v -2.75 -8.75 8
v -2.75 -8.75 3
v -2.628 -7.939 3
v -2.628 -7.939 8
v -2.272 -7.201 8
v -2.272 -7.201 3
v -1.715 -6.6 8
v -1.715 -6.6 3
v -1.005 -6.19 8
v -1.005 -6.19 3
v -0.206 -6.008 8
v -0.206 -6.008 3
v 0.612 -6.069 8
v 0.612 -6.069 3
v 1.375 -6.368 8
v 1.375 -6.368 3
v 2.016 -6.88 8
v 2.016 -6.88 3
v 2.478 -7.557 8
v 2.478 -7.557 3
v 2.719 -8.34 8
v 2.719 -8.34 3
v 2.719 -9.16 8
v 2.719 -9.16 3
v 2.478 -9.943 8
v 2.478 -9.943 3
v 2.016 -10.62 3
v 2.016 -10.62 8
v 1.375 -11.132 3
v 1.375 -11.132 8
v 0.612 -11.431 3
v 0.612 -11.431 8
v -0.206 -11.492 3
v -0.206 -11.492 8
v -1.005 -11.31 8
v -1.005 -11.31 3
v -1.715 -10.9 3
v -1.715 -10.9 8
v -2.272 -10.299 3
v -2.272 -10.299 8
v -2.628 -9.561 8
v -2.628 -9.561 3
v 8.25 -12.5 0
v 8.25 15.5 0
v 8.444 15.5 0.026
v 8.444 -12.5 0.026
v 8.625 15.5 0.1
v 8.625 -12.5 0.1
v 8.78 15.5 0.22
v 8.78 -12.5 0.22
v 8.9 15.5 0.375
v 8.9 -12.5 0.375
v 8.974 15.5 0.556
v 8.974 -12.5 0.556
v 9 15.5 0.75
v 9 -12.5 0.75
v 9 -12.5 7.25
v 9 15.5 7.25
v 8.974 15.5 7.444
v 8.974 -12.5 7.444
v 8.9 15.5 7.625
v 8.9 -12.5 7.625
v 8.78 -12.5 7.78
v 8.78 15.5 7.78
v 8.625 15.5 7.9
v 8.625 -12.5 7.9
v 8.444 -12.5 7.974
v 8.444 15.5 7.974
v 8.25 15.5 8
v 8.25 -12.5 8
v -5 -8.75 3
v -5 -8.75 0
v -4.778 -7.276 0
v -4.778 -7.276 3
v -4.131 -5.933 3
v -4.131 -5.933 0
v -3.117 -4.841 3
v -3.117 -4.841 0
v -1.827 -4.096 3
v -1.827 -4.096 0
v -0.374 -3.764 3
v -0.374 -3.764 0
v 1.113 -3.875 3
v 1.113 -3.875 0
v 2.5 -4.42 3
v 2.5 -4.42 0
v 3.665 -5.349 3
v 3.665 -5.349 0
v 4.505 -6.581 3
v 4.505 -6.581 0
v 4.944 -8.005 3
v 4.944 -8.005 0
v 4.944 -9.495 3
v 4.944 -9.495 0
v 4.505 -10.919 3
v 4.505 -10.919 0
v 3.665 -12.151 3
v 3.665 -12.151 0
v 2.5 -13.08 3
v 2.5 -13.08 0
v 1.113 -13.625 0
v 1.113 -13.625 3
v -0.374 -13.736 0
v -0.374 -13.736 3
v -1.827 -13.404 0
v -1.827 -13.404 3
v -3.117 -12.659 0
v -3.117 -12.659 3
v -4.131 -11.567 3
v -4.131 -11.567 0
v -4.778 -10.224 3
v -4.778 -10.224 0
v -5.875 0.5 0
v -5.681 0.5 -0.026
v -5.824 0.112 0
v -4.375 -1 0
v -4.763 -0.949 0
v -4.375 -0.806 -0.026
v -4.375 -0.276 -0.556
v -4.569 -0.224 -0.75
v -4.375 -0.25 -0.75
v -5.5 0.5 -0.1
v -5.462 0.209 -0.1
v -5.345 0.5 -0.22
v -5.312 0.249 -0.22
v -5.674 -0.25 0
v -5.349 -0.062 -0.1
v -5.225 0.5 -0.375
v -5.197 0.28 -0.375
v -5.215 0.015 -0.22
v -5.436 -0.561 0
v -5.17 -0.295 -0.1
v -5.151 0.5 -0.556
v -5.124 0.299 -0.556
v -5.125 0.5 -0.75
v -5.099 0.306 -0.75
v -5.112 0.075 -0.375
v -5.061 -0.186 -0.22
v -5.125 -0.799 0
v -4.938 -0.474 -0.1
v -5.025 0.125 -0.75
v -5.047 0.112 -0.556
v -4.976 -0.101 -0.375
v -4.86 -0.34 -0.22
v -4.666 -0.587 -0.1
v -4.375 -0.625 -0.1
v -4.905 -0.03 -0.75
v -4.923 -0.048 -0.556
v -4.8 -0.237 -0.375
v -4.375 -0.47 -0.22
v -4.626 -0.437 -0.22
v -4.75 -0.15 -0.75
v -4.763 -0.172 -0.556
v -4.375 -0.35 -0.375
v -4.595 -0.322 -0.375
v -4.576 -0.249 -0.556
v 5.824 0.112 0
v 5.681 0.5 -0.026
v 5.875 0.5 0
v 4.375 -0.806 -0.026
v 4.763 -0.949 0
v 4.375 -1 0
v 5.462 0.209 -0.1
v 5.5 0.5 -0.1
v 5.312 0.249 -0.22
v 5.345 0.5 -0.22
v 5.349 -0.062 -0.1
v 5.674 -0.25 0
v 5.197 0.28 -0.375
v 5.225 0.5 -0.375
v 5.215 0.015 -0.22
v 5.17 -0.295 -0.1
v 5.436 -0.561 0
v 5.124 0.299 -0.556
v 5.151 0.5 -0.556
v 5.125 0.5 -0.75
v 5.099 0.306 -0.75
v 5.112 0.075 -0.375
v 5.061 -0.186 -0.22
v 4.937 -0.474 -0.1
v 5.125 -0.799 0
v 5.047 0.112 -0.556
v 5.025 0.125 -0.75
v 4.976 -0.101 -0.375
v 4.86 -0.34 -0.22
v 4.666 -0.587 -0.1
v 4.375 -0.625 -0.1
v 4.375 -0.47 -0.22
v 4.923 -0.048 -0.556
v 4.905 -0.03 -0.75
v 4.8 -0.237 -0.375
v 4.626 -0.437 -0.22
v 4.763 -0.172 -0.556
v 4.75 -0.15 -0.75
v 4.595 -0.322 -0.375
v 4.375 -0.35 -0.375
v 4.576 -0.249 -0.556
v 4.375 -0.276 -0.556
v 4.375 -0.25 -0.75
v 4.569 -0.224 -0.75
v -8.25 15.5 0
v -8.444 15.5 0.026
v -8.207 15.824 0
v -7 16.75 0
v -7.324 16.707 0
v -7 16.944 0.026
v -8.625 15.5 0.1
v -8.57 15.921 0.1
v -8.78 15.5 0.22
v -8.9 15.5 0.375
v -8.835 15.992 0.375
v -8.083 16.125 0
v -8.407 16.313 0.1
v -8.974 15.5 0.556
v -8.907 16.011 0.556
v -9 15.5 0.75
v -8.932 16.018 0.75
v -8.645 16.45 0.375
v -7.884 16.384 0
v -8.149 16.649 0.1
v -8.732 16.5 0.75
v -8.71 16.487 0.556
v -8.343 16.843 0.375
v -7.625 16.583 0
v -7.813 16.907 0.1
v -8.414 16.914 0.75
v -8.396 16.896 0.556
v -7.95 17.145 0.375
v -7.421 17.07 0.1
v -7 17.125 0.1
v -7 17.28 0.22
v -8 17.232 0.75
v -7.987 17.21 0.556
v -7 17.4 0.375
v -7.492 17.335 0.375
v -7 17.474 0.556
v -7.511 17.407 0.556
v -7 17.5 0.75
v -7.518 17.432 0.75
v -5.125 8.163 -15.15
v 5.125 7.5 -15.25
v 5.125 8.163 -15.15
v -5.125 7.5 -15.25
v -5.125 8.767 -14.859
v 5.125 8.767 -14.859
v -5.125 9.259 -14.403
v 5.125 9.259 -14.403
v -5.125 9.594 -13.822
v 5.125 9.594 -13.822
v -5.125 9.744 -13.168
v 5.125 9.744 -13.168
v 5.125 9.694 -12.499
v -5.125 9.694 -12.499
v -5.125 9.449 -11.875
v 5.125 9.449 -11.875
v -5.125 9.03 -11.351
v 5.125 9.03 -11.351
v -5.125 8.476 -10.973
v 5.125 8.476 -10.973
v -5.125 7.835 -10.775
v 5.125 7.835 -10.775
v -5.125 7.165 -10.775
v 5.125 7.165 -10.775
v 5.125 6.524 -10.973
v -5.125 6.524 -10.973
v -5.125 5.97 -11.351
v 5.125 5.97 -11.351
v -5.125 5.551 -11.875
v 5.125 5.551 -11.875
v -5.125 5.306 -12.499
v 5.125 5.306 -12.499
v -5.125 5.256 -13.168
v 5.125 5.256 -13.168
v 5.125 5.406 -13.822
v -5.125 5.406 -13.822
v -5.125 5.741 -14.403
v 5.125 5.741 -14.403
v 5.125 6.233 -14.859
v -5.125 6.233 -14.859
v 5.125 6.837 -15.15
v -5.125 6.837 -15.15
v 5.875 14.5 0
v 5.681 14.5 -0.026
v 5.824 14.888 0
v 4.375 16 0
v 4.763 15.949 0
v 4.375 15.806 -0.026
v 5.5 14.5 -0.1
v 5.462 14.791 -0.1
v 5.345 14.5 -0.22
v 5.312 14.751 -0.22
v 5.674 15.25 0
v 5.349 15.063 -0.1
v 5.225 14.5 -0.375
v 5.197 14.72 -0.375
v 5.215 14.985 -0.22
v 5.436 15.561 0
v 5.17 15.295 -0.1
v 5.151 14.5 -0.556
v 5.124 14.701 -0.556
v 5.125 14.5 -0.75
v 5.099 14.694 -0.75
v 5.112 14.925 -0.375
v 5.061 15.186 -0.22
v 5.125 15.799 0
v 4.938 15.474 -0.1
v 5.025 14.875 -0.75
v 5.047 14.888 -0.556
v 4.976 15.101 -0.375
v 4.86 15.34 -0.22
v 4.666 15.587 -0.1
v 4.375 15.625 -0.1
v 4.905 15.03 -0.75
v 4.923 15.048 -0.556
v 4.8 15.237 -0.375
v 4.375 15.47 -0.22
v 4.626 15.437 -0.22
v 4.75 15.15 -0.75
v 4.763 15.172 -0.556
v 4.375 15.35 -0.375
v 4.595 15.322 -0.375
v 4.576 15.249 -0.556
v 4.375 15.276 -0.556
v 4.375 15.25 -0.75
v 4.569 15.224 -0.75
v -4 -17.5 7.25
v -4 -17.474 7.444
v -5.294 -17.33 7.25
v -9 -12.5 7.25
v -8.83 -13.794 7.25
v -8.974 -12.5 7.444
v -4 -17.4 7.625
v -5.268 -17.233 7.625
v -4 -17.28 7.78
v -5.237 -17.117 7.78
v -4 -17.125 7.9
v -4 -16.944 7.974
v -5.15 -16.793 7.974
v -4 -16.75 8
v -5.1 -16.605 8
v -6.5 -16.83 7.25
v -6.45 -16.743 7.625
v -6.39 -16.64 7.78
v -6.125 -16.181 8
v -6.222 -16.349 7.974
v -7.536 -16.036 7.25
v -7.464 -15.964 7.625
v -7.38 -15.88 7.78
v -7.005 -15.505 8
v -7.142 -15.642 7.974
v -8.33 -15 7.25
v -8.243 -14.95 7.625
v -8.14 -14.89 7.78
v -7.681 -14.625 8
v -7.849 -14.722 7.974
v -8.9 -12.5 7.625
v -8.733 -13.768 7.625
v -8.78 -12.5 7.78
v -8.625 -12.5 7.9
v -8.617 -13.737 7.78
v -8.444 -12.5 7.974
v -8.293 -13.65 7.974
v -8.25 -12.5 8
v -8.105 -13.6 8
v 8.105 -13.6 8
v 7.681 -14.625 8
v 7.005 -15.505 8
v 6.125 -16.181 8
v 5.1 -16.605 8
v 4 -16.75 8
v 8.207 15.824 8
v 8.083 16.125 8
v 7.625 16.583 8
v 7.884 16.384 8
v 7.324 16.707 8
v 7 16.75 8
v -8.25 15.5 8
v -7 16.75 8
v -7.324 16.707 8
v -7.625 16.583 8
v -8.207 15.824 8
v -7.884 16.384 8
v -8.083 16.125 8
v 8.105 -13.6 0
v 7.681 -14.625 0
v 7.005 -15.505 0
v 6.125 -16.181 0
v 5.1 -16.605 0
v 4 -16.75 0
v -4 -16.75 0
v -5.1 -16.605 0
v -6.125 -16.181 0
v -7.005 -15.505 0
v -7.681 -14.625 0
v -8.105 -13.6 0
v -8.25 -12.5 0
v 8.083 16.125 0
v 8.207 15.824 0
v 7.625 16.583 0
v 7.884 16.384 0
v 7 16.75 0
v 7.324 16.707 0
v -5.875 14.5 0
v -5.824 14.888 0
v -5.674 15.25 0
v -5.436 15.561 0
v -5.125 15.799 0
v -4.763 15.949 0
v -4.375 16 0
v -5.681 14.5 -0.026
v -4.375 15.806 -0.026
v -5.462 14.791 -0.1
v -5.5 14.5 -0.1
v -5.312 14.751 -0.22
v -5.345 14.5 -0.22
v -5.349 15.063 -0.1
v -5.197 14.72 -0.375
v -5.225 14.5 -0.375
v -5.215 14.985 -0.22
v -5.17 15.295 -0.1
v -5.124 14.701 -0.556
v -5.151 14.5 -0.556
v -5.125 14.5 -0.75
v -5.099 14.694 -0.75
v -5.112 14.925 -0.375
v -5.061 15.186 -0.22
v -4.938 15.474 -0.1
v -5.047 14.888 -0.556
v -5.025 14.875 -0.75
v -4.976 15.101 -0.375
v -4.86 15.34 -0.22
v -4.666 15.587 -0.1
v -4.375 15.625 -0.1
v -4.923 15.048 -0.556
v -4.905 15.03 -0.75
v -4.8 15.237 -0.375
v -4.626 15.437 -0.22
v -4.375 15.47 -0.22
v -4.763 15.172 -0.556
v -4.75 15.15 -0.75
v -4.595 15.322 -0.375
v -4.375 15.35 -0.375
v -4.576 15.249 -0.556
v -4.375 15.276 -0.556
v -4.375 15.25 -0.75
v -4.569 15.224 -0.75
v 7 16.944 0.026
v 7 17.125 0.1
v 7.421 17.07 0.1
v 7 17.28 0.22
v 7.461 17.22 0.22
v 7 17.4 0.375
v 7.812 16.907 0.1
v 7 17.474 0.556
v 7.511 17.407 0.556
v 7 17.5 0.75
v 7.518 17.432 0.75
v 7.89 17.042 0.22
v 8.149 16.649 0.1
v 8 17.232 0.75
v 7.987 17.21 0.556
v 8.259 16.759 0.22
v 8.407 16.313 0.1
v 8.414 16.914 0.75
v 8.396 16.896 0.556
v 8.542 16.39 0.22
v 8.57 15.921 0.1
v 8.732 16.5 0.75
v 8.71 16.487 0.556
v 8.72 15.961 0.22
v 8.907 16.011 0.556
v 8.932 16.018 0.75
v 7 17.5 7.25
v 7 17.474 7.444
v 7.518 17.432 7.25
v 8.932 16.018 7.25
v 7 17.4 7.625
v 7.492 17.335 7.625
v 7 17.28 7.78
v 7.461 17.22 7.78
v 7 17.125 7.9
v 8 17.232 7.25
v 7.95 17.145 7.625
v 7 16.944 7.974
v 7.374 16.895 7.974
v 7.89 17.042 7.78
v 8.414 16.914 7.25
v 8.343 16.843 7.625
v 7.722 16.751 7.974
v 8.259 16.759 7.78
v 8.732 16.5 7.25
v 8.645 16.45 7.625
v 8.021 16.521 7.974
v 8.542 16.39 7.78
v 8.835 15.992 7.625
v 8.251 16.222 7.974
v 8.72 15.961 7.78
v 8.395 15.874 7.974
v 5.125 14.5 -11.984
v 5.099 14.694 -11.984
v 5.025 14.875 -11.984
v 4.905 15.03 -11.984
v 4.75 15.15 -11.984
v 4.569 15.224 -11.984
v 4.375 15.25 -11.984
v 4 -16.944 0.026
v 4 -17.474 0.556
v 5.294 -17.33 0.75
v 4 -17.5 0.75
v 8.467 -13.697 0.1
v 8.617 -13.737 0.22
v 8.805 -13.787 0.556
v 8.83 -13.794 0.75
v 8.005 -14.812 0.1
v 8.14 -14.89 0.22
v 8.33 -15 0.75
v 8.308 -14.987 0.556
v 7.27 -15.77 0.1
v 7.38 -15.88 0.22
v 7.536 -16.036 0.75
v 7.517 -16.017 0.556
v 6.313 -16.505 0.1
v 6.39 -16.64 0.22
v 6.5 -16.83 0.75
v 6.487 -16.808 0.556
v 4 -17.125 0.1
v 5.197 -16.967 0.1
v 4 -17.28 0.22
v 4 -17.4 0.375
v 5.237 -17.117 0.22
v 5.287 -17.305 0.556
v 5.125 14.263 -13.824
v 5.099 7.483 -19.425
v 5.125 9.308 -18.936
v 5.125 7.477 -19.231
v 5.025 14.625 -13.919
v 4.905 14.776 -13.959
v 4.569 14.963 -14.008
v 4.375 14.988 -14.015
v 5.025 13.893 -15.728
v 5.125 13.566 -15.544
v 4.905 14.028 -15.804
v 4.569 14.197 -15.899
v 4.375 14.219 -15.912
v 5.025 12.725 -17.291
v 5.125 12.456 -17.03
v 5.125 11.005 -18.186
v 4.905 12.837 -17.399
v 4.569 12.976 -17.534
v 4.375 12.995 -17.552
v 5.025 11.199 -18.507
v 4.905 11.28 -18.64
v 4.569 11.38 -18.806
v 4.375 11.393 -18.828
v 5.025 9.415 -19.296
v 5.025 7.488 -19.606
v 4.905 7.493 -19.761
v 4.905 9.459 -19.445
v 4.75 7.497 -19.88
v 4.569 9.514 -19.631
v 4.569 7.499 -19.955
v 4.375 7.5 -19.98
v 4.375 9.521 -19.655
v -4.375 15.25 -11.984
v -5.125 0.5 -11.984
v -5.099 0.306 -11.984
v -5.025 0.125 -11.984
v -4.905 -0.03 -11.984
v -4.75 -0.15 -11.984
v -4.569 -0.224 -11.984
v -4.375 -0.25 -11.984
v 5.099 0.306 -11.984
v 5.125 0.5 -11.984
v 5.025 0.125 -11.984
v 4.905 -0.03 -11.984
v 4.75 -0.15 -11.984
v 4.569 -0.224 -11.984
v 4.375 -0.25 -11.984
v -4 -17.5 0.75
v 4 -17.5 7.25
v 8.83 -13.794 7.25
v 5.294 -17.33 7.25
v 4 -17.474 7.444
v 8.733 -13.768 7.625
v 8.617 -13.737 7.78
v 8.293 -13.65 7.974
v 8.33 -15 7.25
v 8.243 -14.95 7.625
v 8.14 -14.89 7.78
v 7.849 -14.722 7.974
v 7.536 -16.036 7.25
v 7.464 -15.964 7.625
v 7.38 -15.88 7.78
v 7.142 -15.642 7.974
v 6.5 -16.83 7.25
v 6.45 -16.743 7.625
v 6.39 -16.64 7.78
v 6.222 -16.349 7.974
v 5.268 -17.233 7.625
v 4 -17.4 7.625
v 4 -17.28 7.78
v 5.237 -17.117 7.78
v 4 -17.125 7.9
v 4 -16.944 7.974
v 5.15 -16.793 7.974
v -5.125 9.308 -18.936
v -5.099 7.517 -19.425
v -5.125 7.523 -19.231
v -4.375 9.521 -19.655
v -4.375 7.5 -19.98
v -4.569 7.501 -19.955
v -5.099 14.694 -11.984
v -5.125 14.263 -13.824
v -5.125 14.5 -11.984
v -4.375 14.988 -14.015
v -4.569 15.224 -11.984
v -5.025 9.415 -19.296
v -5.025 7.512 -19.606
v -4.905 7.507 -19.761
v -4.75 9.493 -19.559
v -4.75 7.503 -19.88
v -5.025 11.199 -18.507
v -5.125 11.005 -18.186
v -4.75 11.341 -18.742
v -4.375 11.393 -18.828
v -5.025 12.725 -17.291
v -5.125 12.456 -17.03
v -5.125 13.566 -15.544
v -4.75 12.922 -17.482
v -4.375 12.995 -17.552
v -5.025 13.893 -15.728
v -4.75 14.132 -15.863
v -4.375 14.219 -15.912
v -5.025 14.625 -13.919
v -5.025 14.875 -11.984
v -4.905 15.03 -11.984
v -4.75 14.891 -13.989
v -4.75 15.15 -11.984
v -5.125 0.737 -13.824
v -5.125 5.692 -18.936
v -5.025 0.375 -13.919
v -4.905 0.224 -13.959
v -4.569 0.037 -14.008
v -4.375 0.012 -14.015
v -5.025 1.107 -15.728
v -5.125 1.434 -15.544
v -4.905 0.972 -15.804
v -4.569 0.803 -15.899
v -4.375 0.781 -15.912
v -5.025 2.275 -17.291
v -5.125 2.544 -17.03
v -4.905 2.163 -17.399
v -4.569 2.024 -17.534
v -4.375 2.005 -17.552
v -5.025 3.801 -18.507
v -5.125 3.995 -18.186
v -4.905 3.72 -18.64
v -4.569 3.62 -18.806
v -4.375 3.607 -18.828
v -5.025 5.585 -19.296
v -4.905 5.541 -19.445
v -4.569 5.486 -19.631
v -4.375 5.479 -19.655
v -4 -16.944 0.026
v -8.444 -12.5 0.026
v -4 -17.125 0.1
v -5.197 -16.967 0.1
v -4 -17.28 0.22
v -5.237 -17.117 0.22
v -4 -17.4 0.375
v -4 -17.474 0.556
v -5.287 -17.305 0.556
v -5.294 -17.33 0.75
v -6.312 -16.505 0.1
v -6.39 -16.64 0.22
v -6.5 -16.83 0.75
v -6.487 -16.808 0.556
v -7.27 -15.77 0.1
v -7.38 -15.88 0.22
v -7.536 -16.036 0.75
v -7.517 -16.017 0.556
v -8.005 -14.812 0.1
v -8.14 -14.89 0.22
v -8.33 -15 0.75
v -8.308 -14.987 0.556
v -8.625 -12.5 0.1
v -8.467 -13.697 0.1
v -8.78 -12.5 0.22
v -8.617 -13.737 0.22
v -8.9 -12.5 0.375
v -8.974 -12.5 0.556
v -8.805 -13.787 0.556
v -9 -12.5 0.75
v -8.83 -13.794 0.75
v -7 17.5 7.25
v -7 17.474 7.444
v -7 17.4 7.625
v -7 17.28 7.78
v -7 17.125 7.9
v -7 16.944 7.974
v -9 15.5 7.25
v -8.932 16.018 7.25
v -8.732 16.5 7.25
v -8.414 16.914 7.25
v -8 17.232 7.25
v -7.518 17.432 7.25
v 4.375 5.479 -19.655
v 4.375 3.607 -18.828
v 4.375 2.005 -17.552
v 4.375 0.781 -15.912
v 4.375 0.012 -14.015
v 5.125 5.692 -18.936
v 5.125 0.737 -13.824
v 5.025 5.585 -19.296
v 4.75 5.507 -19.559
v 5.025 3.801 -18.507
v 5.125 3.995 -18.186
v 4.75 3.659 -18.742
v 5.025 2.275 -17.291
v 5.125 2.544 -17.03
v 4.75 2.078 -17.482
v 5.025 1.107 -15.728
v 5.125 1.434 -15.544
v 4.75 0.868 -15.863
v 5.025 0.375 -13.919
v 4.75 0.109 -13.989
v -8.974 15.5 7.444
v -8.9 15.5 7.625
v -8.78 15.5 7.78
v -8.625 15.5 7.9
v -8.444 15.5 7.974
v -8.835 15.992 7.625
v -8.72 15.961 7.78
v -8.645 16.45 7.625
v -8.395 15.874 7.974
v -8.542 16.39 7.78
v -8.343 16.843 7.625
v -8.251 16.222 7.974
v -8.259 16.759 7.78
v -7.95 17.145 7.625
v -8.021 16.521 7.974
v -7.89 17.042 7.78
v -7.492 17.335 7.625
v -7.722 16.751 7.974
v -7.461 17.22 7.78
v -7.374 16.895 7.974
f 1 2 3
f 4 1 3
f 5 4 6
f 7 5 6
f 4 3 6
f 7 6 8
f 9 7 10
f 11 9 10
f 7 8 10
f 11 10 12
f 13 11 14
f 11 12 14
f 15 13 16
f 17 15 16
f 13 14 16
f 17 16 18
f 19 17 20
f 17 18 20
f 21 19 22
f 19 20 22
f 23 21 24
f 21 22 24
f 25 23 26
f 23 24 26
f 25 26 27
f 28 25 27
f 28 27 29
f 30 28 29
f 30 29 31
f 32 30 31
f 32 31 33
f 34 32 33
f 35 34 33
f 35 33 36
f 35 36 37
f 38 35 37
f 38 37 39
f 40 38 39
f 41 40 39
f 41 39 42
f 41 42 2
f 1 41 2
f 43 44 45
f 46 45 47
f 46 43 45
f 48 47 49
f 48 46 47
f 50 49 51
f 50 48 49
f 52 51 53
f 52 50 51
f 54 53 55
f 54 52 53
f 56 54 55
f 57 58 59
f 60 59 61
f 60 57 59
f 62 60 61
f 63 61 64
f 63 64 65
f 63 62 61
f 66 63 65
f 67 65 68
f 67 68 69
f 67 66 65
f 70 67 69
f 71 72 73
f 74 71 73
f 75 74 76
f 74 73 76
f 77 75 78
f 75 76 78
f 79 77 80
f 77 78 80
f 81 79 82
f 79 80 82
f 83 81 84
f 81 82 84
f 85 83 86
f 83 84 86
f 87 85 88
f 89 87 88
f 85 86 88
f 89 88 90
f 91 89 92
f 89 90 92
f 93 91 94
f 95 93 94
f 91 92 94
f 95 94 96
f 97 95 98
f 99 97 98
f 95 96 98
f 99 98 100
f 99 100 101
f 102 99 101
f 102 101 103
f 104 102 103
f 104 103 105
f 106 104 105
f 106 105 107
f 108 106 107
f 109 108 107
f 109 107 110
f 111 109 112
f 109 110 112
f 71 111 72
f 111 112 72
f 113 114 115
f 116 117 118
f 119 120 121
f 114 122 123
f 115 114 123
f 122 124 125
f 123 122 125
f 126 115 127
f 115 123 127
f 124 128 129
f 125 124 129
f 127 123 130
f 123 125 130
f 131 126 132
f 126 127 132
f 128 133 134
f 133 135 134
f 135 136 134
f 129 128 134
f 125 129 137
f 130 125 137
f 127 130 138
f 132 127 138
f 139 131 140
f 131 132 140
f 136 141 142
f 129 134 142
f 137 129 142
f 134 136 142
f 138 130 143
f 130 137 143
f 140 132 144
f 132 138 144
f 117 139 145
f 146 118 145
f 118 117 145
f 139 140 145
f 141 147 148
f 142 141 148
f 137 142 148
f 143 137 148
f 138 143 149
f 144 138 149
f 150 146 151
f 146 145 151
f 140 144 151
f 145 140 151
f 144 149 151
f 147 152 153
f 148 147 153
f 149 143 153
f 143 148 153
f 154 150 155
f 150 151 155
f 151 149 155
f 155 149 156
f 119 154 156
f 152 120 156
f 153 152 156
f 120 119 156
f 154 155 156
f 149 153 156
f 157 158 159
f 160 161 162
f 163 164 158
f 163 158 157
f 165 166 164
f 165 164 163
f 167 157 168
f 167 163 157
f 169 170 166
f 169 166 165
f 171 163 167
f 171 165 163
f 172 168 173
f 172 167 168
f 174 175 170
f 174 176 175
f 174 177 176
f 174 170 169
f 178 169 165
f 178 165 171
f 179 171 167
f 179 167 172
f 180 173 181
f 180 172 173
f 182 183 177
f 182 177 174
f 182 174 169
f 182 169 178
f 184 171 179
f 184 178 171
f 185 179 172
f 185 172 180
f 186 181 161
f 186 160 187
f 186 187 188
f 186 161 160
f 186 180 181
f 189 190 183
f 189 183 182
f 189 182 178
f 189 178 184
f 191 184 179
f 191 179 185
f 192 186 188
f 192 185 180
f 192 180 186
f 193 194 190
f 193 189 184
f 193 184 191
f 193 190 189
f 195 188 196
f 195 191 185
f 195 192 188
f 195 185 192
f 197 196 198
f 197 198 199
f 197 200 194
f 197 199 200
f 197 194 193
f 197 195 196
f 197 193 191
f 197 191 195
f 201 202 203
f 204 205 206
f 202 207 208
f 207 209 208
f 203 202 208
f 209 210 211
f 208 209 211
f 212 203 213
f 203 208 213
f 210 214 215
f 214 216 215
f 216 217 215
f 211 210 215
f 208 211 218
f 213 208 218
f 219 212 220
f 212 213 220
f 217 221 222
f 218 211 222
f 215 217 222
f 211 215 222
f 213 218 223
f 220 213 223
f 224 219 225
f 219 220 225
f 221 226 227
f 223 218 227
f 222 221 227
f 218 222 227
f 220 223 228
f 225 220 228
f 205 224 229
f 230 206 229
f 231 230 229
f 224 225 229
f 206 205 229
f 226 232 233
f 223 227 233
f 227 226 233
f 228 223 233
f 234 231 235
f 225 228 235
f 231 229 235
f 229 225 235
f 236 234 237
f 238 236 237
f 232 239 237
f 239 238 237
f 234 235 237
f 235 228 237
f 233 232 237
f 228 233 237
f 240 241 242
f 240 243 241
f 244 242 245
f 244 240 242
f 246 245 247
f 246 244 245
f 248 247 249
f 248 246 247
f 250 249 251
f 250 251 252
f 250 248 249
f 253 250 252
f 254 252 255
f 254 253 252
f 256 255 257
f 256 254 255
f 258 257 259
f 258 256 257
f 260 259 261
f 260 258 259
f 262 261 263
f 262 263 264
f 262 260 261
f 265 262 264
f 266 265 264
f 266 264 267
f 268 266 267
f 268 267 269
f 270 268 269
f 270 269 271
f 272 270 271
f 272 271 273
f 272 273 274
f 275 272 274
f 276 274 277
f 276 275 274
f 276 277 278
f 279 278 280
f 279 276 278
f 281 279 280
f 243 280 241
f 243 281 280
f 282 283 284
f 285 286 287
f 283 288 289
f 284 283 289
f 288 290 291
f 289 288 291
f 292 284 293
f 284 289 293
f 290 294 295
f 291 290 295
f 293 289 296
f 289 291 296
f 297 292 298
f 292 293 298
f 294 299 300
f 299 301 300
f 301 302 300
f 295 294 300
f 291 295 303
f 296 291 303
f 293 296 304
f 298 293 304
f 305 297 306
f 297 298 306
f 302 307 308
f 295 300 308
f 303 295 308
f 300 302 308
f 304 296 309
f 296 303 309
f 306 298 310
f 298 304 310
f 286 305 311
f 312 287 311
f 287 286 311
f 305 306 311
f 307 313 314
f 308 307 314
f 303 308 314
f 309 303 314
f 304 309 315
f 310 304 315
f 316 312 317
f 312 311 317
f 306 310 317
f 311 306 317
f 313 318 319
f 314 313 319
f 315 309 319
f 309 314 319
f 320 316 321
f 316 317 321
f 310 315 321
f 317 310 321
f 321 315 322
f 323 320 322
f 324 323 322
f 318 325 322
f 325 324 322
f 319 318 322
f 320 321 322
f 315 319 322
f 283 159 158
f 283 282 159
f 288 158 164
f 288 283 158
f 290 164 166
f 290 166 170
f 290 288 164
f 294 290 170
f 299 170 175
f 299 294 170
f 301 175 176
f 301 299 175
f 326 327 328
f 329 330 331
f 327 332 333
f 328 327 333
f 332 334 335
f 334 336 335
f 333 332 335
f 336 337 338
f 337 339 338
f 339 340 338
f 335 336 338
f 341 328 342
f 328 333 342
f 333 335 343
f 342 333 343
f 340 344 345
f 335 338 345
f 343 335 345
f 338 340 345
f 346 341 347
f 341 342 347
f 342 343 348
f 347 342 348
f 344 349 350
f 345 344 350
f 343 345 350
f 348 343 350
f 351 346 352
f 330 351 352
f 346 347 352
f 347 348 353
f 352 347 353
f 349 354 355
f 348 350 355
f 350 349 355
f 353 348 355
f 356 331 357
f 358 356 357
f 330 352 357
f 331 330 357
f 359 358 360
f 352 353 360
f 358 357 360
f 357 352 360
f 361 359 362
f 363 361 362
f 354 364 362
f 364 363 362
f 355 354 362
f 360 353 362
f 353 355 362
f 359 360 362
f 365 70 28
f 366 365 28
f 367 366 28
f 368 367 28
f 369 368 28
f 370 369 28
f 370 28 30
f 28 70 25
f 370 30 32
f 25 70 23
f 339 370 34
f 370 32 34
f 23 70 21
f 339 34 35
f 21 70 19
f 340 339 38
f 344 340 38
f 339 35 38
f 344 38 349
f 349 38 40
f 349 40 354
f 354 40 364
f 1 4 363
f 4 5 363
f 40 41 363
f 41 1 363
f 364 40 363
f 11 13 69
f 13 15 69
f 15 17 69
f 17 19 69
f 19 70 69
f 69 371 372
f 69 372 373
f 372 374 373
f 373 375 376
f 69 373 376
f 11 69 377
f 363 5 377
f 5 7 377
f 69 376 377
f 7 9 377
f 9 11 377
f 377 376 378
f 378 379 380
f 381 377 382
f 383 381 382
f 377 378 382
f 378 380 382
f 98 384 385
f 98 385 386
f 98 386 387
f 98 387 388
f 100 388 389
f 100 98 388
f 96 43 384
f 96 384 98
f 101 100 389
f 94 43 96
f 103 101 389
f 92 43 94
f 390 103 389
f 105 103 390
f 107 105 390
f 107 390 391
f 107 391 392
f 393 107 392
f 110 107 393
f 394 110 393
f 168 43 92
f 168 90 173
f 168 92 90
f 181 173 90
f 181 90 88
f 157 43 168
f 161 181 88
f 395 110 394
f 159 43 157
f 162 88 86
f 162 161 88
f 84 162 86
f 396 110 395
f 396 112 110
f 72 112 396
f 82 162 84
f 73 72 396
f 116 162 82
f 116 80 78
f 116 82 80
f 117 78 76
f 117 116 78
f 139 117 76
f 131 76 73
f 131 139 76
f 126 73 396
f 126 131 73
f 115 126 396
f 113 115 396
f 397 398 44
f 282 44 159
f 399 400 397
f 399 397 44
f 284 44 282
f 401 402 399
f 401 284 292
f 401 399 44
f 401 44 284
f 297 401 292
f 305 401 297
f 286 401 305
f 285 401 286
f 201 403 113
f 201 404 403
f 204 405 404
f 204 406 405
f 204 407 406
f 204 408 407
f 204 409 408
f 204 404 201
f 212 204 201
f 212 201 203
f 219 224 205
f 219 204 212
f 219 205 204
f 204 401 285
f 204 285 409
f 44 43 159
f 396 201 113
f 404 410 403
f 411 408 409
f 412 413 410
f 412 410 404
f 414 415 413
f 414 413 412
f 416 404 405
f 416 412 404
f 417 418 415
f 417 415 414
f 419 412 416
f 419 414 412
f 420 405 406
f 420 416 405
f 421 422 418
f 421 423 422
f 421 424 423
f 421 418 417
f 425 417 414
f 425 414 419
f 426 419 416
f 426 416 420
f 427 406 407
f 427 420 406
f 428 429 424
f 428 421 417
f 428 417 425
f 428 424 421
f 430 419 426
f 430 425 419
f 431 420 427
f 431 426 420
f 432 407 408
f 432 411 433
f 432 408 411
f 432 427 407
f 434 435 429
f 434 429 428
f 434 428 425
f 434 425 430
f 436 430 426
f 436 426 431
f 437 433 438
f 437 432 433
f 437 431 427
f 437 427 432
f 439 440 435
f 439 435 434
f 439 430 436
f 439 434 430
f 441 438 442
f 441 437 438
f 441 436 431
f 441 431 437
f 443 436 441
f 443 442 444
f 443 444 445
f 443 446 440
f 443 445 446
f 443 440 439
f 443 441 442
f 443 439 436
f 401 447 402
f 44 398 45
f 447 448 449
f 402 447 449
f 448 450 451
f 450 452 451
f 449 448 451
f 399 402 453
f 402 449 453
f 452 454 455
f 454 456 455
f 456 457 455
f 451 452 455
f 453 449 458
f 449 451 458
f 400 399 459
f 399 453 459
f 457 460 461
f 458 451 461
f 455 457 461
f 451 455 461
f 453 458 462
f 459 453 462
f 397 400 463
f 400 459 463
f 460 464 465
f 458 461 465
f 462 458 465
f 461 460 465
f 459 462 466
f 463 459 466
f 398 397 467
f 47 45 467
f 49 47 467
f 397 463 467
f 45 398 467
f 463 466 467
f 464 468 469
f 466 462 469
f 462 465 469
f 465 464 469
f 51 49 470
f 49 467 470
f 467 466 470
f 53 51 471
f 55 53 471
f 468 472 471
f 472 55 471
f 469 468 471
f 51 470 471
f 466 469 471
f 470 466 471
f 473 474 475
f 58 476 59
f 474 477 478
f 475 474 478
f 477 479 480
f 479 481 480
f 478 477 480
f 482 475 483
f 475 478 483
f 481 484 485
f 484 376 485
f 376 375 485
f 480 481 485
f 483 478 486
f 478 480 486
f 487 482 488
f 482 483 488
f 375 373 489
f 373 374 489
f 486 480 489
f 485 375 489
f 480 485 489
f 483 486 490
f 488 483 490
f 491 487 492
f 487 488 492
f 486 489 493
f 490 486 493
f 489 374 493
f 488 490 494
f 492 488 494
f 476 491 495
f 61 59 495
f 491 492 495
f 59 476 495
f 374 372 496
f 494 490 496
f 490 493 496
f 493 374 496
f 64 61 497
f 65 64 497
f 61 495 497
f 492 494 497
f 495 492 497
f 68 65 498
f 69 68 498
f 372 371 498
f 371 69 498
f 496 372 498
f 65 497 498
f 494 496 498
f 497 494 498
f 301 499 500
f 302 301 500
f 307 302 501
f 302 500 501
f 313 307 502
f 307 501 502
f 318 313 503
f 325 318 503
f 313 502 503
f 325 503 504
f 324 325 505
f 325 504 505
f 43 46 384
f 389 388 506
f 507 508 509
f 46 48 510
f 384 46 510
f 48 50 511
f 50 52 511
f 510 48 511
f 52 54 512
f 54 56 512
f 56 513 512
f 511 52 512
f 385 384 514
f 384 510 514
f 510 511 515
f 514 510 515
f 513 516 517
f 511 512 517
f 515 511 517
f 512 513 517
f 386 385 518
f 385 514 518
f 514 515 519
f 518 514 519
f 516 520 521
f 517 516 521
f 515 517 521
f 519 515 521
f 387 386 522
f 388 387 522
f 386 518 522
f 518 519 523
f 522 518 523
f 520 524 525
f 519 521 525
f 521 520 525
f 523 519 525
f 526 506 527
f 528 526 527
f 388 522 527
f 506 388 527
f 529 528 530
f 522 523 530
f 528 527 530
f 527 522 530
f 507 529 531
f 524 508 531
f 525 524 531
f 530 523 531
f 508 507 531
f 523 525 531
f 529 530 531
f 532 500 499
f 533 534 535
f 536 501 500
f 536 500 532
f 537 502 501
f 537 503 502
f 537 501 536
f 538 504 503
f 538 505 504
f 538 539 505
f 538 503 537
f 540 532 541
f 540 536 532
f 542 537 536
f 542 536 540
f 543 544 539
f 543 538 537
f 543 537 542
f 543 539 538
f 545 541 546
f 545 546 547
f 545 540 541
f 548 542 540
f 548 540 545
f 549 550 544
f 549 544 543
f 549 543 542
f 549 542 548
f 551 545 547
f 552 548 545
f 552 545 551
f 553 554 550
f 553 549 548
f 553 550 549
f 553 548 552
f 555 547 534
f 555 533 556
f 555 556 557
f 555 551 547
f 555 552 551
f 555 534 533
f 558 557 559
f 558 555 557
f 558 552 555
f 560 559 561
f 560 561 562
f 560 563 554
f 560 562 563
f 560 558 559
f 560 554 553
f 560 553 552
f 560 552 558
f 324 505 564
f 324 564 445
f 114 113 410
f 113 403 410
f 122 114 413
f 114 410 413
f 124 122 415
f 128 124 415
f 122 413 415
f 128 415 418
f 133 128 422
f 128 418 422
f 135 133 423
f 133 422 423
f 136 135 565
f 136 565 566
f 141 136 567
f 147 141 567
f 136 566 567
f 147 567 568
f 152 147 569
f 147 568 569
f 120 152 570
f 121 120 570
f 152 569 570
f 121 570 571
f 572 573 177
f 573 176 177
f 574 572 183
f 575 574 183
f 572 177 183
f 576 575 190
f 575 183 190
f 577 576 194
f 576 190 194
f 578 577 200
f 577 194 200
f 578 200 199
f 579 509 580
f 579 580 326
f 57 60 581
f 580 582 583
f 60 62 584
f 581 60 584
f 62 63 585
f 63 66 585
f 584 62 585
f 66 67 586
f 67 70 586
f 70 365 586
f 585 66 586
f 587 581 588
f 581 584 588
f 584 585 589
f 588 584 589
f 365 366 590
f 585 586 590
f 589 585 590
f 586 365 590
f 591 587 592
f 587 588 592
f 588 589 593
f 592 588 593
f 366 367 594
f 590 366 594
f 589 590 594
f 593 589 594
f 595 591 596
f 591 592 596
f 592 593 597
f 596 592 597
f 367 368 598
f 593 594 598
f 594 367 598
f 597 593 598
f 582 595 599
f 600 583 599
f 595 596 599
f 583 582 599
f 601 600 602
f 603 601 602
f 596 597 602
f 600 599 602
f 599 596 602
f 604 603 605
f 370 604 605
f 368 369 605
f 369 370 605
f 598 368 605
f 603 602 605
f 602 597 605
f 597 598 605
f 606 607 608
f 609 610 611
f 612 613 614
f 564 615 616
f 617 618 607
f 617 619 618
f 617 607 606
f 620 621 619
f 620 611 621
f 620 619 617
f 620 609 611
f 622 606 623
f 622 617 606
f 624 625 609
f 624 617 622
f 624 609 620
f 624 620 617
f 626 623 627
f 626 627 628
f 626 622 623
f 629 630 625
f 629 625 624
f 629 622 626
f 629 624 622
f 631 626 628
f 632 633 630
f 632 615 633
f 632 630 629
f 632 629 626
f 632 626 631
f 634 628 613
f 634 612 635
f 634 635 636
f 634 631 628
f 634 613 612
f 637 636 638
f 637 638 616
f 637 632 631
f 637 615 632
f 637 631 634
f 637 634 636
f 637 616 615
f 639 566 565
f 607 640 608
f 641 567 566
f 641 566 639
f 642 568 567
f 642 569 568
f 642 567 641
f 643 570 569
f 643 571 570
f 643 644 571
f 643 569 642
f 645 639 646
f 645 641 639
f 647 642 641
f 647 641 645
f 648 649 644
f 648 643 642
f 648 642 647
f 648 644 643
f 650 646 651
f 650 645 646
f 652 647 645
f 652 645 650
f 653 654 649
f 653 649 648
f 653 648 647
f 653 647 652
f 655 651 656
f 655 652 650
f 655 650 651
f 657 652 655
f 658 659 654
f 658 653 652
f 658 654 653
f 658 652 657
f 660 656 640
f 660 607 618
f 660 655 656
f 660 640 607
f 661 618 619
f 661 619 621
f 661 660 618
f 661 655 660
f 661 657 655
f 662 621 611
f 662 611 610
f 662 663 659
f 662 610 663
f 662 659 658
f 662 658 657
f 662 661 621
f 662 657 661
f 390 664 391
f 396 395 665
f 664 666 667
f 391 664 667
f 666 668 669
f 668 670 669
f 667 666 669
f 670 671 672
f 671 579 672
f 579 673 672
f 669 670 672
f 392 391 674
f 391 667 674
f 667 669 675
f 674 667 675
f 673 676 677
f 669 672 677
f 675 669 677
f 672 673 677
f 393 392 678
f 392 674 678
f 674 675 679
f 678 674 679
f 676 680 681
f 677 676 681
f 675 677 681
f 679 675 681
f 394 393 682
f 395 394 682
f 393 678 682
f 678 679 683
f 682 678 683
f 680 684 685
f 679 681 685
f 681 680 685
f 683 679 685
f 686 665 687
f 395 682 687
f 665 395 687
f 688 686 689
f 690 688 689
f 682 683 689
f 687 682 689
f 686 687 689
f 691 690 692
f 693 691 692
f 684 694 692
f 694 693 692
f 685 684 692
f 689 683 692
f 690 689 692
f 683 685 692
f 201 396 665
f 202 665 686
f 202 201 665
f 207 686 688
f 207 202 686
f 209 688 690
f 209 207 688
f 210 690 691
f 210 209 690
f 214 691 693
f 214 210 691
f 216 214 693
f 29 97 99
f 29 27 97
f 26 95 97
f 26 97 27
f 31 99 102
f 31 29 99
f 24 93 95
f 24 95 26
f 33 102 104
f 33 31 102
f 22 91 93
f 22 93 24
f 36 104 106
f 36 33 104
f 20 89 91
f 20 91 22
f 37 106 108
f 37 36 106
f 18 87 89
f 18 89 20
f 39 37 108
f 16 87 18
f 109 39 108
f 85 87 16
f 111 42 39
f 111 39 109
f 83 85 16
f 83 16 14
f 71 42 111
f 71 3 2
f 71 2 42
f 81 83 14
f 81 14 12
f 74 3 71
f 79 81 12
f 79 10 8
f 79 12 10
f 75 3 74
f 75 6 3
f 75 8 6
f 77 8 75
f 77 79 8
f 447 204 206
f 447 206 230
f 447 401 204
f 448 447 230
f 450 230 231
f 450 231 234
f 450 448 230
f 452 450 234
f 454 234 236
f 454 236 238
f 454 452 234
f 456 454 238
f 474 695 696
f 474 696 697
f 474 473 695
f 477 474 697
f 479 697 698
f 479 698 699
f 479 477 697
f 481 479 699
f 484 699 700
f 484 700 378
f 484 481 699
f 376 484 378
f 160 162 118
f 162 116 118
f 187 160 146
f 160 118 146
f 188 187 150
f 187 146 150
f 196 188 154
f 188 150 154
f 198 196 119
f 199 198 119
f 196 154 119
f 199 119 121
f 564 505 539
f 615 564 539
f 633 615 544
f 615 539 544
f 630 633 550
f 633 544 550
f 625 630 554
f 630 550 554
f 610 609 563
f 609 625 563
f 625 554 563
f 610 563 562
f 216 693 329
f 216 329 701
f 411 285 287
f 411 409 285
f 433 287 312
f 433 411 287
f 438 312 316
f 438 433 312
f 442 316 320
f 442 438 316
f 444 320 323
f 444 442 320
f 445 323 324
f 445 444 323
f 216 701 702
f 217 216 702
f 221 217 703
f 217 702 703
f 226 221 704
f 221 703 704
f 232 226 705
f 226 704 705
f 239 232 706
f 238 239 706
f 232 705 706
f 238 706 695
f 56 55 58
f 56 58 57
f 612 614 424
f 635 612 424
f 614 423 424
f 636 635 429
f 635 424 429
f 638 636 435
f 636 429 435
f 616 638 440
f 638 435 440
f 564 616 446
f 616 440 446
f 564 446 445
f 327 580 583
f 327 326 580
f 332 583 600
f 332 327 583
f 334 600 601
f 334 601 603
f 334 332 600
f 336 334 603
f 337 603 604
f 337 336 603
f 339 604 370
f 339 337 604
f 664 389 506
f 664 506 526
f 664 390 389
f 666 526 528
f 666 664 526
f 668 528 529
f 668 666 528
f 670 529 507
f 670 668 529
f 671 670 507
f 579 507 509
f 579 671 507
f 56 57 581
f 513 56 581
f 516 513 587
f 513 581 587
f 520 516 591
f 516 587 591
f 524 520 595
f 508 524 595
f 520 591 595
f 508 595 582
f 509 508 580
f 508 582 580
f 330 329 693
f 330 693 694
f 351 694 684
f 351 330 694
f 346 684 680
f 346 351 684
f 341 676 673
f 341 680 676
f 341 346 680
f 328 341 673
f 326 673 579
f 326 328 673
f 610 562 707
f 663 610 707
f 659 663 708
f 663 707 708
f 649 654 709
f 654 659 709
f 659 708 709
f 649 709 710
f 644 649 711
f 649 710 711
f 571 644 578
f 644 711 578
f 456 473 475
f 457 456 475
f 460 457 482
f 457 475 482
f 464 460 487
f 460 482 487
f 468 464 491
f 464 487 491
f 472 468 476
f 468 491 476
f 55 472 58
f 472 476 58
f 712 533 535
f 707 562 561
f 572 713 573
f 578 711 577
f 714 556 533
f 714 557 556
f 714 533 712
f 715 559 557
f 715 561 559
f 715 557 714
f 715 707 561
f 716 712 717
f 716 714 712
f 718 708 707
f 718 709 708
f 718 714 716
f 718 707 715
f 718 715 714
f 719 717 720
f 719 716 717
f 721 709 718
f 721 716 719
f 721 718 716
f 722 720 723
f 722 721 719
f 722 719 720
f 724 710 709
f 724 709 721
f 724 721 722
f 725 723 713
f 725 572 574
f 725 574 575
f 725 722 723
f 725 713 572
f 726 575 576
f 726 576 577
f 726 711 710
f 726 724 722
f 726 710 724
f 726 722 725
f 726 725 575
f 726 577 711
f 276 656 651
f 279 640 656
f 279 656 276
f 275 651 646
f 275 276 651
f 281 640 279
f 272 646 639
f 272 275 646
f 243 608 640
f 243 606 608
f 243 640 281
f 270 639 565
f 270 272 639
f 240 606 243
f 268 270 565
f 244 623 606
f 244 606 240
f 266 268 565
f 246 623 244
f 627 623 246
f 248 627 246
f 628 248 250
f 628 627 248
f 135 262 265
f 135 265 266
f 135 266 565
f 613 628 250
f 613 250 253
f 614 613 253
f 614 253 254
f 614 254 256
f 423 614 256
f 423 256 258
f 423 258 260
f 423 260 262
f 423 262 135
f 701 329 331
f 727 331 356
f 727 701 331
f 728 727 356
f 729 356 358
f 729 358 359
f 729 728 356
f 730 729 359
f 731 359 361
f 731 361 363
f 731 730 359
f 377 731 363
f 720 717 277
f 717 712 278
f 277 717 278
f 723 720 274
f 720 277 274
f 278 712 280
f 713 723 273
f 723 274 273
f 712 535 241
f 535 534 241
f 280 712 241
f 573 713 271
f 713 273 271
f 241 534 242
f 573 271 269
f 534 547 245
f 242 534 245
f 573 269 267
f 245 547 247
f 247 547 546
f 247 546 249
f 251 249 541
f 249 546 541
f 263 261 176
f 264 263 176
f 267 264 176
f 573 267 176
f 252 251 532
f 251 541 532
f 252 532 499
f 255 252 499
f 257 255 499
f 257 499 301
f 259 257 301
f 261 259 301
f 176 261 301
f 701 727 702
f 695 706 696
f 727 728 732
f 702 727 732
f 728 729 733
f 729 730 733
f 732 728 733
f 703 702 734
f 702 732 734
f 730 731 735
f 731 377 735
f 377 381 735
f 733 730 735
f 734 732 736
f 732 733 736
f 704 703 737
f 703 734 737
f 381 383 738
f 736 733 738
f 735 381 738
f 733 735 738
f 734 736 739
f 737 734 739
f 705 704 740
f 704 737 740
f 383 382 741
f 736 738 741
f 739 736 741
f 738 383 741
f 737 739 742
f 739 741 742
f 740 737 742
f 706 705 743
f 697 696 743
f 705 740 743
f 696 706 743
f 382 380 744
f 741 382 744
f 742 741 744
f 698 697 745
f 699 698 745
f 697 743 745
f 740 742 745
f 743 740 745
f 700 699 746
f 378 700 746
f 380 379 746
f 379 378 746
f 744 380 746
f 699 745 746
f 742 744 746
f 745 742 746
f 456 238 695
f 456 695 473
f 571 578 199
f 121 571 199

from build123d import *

# Parameters (mm, degrees)
BOSS_EXTRUDE1_DEPTH = 8
SKETCH2_R           = 2.2500000000000058
BOSS_EXTRUDE2_DEPTH = 5.125
FILLET1_R           = 10
FILLET5_R           = 5
FILLET6_R           = 2
SKETCH5_R           = 2.749999999999998
CUT_EXTRUDE1_DEPTH  = 29.057975693196408
SKETCH5_3_R         = 5.000000000000001
SKETCH5_3_R_2       = 2.749999999999998
CUT_EXTRUDE2_DEPTH  = 3
CUT_EXTRUDE3_DEPTH  = 31.095940340849967
FILLET8_R           = 8
FILLET11_R          = 0.75


# Some blends are built 0.0001 mm under size
with BuildPart() as part:
    # Sketch1 → Boss-Extrude1 (new body)
    with BuildSketch(Plane.XY):
        Polygon((-9, 17.500000000000004), (9, 17.500000000000004), (9.000000000000004, -17.499999999999996), (-8.999999999999996, -17.499999999999996), align=None)
    extrude(amount=BOSS_EXTRUDE1_DEPTH)

    # Sketch2 → Boss-Extrude2 (add, symmetric)
    with BuildSketch(Plane(origin=(0, 0, 0), x_dir=(0, 0, -1), z_dir=(1, 0, 0))):
        Polygon((0, 17.500000000000004), (20, 17.500000000000007), (20.000000000000007, -2.499999999999992), (2.14e-15, -2.499999999999992), align=None)
        with Locations((13.000000000000002, 7.500000000000007)):
            Circle(SKETCH2_R, mode=Mode.SUBTRACT)
    extrude(amount=BOSS_EXTRUDE2_DEPTH, both=True)

    # Fillet1
    fillet1_edges = [part.edges().sort_by_distance(p)[0] for p in [
        (0, 17.500000000000007, -20),
        (0, -2.499999999999992, -20.000000000000007),
    ]]
    fillet(fillet1_edges, radius=FILLET1_R - 0.0001)  # a hair under: the kernel refuses the full size

    # Fillet5
    fillet5_edges = [part.edges().sort_by_distance(p)[0] for p in [
        (9.000000000000004, -17.499999999999996, 4),
        (-8.999999999999996, -17.499999999999996, 4),
    ]]
    fillet(fillet5_edges, radius=FILLET5_R)

    # Fillet6
    fillet6_edges = [part.edges().sort_by_distance(p)[0] for p in [
        (-9, 17.500000000000004, 4),
        (9, 17.500000000000004, 4),
    ]]
    fillet(fillet6_edges, radius=FILLET6_R)

    # Sketch5 → Cut-Extrude1 (cut, through all)
    with BuildSketch(Plane(origin=(0, 0, 0), x_dir=(-1, 0, 0), z_dir=(0, 0, -1))):
        with Locations((0, -8.75)):
            Circle(SKETCH5_R)
    extrude(amount=-CUT_EXTRUDE1_DEPTH, mode=Mode.SUBTRACT)

    # Sketch5<3> → Cut-Extrude2 (cut)
    with BuildSketch(Plane(origin=(0, 0, 0), x_dir=(-1, 0, 0), z_dir=(0, 0, -1))):
        with Locations((0, -8.75)):
            Circle(SKETCH5_3_R)
        with Locations((0, -8.75)):
            Circle(SKETCH5_3_R_2, mode=Mode.SUBTRACT)
    extrude(amount=-CUT_EXTRUDE2_DEPTH, mode=Mode.SUBTRACT)

    # Sketch6 → Cut-Extrude3 (cut, through all)
    with BuildSketch(Plane(origin=(5.125, 0, 0), x_dir=(0, 0, -1), z_dir=(1, 0, 0))):
        Polygon((0, 17.500000000000004), (20, 17.500000000000004), (20.000000000000004, 15.250000000000005), (2.8e-16, 15.250000000000005), align=None)
        Polygon((19.999999999999996, -2.499999999999992), (20.000000000000004, -0.24999999999998807), (7.21e-15, -0.24999999999999156), (6.94e-15, -2.499999999999992), align=None)
    extrude(amount=-CUT_EXTRUDE3_DEPTH, mode=Mode.SUBTRACT)

    # Fillet8
    # the kernel refuses this fillet: 8 mm, written as the material it takes off along each edge
    with BuildSketch(Plane(origin=(29.35923701875709, -0.2499999999999887, -16.31967672633224), x_dir=(0, -1.5e-16, 1), z_dir=(-1, 0, 0))) as fillet8_piece_1:
        with BuildLine():
            CenterArc((4.335351436704053, 8), FILLET8_R, 172.8217708442513, 97.17822915574868)
            Line((-3.6019465867097984, 8.99964998249916), (-4.395676389051184, 9.099614980749076))
            ThreePointArc((-4.395676389051184, 9.099614980749076), (-4.480323273667765, 7.750099999999992), (-0.5055711938185182, -0.6199981999819997))
            Line((-0.5055711938185182, -0.6199981999819997), (1.2e-16, -0.8))
            Line((1.2e-16, -0.8), (4.335351436704052, -0.8))
            Line((4.335351436704052, -0.8), (4.335351436704052, 0))
        make_face()
    extrude(amount=58.718474037514184, mode=Mode.SUBTRACT)
    with BuildSketch(Plane(origin=(29.35923701875702, 15.250000000000005, -16.31967672633223), x_dir=(0, -0.9284024472828977, -0.37157623158529146), z_dir=(-1, 0, 0))) as fillet8_piece_2:
        with BuildLine():
            CenterArc((5.816306028814807, 6.9975607363498025), FILLET8_R, 201.81286045411787, 97.17822915574845)
            Line((-1.610913549448369, 4.024950883667459), (-2.3536355072746873, 3.727689898399224))
            Line((-2.3536355072746873, 3.727689898399224), (-0.7427219578263171, -0.29726098526823275))
            Line((-0.7427219578263171, -0.29726098526823275), (-0.38774960717711915, -0.6997501283558207))
            ThreePointArc((-0.38774960717711915, -0.6997501283558207), (8.859993445000528, -1.2797901394825208), (10.081433685371605, -0.6997560736349794))
            Line((10.081433685371605, -0.6997560736349794), (9.693694807502807, 5.1e-16))
        make_face()
    extrude(amount=58.71847403751404, mode=Mode.SUBTRACT)

    # Fillet11
    fillet11_edges = [part.edges().sort_by_distance(p)[0] for p in [
        (5.125, -0.2499999999999905, -5.9921626448140035),
        (-5.125, -0.24999999999999029, -5.9921626448140035),
        (5.125, 12.994562646523407, -17.552089652471594),
        (5.125, 2.00543735344751, -17.5520896524431),
        (-5.125, 12.994562646523407, -17.552089652471594),
        (-5.125, 2.00543735344751, -17.5520896524431),
        (0, 17.500000000000004, 0),
        (9.000000000000002, 1.5000000000000036, 0),
        (9.000000000000002, 1.5000000000000036, 8),
        (3.55e-15, -17.499999999999996, 0),
        (-7.535533905932736, -16.035533905932734, 0),
        (7.535533905932741, -16.035533905932734, 0),
        (3.55e-15, -17.499999999999996, 8),
        (-7.535533905932736, -16.035533905932734, 8),
        (7.535533905932741, -16.035533905932734, 8),
        (-8.999999999999998, 1.5000000000000036, 0),
        (-8.999999999999998, 1.5000000000000036, 8),
        (8.414213562373096, 16.9142135623731, 0),
        (-8.414213562373096, 16.9142135623731, 0),
        (0, 17.500000000000004, 8),
        (8.414213562373096, 16.9142135623731, 8),
        (-8.414213562373096, 16.9142135623731, 8),
        (-5.125, 7.500000000000006, -1.07e-15),
        (5.125, 7.500000000000006, -1.07e-15),
        (-5.125, 15.250000000000005, -5.992162644814096),
        (0, 15.250000000000005, -2.8e-16),
        (5.125, 15.250000000000005, -5.992162644814096),
        (0, -0.24999999999999156, -7.21e-15),
    ]]
    fillet(fillet11_edges, radius=FILLET11_R)


solid = part.part
